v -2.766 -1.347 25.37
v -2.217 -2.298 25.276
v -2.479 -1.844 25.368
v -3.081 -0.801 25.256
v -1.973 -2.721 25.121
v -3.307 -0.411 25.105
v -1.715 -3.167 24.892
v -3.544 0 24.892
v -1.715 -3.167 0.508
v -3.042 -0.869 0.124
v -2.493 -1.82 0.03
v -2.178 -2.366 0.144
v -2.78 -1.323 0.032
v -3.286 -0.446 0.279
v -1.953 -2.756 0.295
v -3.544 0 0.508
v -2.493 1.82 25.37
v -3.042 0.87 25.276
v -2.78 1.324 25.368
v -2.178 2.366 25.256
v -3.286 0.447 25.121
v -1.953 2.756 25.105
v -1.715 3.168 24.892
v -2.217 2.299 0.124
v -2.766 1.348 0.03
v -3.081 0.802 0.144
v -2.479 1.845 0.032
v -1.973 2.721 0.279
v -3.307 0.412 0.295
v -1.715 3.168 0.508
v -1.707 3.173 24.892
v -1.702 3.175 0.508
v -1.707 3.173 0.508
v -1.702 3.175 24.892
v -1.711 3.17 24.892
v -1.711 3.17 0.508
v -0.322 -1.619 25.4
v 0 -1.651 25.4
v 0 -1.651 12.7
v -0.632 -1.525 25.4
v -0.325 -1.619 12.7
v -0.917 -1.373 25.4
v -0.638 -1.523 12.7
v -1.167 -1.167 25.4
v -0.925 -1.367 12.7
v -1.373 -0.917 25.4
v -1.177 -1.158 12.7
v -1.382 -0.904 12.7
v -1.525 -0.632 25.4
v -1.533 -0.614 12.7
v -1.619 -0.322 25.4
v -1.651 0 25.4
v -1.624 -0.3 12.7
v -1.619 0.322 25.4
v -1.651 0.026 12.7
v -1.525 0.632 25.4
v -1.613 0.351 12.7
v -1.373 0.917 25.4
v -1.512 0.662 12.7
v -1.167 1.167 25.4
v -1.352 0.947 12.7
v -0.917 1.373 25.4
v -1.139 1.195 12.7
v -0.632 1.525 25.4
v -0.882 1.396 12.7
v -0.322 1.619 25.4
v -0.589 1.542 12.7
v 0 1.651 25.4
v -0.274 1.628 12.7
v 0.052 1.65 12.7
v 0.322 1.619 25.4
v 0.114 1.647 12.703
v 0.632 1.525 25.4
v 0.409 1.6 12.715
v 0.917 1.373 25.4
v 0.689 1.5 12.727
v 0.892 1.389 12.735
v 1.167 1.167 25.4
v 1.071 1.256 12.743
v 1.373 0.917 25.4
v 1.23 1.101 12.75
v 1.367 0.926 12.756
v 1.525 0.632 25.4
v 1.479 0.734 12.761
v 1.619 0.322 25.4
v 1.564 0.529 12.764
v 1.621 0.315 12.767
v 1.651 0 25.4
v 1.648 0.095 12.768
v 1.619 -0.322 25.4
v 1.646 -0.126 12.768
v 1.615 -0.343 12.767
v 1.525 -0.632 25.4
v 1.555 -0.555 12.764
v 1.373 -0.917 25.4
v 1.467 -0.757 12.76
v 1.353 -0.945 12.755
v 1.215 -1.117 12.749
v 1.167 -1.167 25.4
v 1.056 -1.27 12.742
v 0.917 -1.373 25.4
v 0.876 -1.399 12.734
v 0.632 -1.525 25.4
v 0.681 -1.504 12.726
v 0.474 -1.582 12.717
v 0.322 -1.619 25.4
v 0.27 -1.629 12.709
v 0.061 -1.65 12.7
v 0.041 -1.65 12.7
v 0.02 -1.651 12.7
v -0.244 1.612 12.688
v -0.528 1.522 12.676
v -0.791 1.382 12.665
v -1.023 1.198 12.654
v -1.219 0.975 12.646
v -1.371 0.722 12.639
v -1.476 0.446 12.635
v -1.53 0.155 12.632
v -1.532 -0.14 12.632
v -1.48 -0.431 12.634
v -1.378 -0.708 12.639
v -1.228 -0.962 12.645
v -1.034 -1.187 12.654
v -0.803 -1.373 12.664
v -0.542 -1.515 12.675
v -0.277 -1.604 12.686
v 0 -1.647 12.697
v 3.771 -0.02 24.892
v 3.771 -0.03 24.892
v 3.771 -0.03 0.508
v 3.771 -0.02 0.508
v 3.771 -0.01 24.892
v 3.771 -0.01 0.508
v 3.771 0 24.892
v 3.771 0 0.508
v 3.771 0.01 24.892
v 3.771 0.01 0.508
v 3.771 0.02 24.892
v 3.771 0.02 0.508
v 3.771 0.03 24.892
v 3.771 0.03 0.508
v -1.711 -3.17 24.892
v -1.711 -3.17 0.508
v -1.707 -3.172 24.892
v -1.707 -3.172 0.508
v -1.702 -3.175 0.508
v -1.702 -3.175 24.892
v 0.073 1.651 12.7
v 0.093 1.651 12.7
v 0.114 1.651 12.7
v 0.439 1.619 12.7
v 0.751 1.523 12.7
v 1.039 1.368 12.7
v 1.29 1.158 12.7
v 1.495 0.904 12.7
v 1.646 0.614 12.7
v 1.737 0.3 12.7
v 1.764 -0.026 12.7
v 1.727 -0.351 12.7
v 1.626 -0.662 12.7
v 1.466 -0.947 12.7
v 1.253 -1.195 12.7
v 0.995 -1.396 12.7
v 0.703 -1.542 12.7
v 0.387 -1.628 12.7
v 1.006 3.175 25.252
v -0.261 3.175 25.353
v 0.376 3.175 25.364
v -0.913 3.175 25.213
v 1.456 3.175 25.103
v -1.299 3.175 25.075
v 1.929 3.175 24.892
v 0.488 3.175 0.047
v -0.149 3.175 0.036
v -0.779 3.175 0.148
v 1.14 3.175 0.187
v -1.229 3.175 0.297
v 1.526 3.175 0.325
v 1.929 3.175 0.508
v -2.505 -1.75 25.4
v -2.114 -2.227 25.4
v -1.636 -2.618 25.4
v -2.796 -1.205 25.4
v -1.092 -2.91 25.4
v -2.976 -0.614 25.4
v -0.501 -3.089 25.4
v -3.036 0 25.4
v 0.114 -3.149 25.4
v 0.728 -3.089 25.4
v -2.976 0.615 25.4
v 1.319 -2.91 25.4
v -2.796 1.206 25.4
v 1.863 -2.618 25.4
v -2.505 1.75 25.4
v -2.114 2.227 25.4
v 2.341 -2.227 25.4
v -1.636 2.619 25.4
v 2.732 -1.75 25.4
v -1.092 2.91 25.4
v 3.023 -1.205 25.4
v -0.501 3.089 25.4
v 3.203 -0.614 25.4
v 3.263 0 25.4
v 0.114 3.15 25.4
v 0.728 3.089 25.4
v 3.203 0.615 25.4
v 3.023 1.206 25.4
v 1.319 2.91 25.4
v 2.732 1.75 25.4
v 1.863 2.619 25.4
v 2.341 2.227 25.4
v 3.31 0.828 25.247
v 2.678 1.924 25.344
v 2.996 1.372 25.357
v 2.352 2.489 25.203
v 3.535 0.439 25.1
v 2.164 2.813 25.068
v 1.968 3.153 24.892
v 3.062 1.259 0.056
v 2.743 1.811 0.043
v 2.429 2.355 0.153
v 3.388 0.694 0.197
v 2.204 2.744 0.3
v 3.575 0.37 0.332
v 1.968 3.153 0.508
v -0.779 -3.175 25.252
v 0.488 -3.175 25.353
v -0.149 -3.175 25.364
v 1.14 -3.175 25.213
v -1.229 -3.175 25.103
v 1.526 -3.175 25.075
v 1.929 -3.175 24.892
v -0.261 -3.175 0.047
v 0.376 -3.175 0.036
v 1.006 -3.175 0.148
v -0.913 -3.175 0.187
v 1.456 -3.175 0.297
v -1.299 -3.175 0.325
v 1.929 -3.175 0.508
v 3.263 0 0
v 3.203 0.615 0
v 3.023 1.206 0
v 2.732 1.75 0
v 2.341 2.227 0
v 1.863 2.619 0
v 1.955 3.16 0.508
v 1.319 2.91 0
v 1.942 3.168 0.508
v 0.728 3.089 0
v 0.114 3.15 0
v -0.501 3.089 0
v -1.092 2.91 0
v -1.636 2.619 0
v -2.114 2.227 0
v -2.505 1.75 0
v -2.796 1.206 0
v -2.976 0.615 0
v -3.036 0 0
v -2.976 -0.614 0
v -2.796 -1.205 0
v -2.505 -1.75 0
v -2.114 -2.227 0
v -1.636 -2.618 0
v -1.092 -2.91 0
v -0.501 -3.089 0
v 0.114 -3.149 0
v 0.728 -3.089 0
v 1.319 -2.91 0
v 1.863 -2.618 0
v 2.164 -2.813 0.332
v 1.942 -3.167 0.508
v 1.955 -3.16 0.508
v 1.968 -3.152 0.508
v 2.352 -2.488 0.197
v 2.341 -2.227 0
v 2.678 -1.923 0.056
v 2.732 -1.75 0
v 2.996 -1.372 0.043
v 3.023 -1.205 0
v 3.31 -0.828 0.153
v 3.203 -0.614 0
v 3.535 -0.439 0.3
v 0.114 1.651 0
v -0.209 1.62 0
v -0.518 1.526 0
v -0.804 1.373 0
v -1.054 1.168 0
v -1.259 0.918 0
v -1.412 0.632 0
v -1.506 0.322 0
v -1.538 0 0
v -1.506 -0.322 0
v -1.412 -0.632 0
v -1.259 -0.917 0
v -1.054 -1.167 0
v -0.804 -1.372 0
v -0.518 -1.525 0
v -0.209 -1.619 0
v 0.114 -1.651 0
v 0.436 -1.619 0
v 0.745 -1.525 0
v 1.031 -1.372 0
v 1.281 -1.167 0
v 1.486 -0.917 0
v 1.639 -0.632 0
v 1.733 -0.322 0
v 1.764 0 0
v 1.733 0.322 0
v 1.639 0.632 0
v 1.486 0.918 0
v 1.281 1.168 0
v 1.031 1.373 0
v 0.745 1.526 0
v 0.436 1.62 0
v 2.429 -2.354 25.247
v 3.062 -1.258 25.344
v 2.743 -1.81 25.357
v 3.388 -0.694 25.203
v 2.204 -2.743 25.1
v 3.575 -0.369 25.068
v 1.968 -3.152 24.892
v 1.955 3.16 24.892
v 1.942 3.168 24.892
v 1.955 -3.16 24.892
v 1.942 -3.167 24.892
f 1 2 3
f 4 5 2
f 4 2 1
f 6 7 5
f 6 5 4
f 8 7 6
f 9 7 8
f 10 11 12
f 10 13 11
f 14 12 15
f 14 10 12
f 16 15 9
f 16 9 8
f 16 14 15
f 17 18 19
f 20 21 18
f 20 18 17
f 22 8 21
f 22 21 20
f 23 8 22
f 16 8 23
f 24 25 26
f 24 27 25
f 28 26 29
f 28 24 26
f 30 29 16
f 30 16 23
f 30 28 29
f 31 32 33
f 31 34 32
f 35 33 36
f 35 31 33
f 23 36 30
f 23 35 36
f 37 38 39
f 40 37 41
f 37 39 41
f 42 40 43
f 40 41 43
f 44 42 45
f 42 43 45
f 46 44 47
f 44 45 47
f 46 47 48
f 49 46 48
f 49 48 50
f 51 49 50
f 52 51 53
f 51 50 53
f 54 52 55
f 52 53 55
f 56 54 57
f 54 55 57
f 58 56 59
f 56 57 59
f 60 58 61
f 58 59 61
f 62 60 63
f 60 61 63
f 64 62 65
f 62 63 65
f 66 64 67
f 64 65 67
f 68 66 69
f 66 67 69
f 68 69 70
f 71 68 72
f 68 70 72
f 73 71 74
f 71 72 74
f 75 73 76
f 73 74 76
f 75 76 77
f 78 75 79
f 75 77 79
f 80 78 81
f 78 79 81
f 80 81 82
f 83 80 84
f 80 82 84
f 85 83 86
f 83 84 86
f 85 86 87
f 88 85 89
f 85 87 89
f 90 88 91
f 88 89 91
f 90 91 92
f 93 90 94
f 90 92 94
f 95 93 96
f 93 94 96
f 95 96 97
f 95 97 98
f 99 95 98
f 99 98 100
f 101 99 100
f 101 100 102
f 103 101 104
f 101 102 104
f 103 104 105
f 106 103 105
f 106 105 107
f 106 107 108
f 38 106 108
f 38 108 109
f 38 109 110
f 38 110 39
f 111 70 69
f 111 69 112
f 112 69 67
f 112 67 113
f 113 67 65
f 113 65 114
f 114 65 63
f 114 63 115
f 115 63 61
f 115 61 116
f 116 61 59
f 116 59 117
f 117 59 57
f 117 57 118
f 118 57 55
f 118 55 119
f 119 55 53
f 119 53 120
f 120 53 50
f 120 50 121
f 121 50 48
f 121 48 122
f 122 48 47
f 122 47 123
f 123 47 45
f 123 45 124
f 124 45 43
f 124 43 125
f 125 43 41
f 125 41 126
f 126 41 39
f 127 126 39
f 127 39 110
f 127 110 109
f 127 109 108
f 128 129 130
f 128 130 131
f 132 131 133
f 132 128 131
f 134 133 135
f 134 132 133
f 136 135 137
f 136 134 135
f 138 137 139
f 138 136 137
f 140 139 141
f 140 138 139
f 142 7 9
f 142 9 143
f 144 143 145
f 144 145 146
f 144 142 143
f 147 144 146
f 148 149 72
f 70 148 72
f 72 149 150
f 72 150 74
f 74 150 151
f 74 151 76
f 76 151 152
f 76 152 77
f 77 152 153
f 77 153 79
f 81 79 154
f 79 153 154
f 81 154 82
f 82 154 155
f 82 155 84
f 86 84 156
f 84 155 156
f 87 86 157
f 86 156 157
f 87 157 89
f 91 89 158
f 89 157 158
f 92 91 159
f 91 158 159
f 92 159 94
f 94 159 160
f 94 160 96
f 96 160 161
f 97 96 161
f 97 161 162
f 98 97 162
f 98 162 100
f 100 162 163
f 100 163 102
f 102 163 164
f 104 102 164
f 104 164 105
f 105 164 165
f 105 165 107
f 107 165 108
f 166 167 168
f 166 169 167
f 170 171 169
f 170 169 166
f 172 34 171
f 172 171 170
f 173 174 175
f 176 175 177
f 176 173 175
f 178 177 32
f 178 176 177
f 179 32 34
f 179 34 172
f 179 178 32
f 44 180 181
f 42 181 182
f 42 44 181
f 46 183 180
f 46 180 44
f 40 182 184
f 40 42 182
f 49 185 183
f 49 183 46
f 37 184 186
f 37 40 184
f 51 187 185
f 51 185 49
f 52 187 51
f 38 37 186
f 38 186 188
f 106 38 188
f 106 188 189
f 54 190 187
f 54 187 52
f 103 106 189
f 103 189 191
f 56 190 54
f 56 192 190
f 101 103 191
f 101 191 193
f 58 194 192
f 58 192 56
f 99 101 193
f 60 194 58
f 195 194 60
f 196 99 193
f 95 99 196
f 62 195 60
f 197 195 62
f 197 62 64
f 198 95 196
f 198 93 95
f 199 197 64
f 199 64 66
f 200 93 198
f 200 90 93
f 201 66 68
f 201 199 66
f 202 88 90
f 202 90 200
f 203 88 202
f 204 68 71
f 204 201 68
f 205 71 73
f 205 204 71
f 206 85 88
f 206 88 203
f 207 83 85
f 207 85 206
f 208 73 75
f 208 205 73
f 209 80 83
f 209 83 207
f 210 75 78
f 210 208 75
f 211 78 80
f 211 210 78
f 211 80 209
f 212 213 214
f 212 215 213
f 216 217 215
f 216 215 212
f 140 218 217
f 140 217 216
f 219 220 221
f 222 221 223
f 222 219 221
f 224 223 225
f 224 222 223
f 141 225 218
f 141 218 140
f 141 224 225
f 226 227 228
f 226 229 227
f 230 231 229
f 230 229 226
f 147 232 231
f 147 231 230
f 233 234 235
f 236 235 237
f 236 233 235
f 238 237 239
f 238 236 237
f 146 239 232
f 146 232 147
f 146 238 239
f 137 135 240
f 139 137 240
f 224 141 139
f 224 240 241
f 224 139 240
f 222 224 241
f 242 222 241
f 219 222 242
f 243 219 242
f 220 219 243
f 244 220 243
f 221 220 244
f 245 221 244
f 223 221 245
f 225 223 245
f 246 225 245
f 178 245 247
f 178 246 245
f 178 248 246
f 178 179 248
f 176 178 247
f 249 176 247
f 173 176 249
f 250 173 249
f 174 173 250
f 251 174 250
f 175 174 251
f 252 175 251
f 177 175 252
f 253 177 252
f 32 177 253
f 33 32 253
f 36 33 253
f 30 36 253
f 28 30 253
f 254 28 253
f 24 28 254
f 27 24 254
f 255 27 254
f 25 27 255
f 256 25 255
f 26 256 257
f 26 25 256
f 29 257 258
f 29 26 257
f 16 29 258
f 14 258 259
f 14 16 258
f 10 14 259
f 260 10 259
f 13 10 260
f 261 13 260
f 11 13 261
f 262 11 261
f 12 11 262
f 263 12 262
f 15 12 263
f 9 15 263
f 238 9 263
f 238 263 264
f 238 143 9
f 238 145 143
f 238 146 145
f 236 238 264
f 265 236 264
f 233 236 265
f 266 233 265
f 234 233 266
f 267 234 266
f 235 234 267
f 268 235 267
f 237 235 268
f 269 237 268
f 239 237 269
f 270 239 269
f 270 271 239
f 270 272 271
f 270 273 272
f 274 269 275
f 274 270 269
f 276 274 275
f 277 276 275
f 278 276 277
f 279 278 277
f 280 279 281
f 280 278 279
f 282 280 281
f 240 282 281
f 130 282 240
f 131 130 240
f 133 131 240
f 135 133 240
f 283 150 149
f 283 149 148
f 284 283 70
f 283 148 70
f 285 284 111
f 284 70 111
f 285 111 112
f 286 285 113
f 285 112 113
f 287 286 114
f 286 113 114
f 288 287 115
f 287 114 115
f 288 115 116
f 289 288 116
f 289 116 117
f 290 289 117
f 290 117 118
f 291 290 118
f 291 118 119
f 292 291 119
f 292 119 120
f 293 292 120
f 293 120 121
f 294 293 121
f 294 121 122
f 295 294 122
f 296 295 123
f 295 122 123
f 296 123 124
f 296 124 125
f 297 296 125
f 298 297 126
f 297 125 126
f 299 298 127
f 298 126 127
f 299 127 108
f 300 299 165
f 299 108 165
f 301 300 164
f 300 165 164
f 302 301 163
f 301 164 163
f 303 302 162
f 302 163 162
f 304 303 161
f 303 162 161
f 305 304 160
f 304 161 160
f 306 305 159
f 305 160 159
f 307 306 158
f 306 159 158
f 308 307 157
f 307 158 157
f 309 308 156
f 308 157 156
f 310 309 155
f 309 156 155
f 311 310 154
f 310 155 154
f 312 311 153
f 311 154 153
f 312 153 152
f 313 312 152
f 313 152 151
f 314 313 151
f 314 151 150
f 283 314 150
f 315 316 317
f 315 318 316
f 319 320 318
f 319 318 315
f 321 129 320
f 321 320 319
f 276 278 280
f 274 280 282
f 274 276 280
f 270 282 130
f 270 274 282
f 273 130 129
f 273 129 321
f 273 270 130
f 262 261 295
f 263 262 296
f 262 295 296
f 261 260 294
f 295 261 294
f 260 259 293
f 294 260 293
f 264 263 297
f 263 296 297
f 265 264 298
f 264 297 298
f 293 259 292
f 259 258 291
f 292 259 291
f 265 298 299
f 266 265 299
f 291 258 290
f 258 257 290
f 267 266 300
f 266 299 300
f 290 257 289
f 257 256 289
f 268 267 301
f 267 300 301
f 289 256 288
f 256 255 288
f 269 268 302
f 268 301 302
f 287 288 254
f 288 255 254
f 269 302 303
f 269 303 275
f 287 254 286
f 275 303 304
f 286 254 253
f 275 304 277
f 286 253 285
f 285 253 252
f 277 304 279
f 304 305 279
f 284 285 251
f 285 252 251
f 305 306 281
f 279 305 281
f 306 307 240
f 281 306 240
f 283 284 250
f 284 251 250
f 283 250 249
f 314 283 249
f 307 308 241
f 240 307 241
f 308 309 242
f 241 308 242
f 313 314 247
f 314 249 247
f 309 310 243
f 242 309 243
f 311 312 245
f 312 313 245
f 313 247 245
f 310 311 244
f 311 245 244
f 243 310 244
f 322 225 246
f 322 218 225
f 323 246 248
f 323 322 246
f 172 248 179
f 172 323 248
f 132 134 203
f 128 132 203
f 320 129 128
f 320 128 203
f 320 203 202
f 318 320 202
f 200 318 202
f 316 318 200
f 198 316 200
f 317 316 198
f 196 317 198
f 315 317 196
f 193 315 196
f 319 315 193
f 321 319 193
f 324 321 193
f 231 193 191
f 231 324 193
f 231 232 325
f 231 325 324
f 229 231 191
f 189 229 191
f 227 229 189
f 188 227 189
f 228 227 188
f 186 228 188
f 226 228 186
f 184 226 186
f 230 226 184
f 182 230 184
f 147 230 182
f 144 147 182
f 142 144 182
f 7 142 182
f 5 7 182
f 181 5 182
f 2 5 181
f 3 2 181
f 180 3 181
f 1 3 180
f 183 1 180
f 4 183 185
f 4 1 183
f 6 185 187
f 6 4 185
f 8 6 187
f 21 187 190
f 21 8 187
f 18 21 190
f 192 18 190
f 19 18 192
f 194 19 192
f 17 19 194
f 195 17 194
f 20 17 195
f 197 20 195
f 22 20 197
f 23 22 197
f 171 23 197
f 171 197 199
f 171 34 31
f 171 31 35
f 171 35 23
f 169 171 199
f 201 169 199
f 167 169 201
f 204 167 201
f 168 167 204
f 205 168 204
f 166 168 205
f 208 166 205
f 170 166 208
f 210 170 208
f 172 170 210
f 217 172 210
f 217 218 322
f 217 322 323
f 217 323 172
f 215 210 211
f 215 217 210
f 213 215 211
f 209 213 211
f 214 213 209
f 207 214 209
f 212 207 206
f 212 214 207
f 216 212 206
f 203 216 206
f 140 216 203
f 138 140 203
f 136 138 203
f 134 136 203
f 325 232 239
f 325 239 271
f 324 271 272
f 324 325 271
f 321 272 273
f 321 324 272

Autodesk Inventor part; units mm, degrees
ref_plane "YZ Plane" through (0, 0, 0) normal (1, 0, 0) x (0, 1, 0)
sketch "Sketch1" plane through (0, 0, 0) normal (0, 0, 1) x (1, 0, 0)
  line L0 (1.9552, -3.1747) -> (-1.711, -3.1747)
  line L1 (-1.711, -3.1747) -> (-3.5441, 0.0003)
  line L2 (-3.5441, 0.0003) -> (-1.711, 3.1753)
  line L3 (-1.711, 3.1753) -> (1.9552, 3.1753)
  line L4 (1.9552, 3.1753) -> (3.7883, 0.0003)
  line L5 (3.7883, 0.0003) -> (1.9552, -3.1747)
  point P0 (0.1221, 0.0003)
  dimension "d0" = 6.35
extrude "Extrusion1" add sketch "Sketch1" along normal blind 25.4
ref_plane "Work Plane1" through (-1.711, 0.0003, 0) normal (0, 1, 0) x (1, 0, 0)
sketch "Sketch3" plane through (-1.711, 0.0003, 0) normal (0, 1, 0) x (1, 0, 0)
  line L0 (-1.3251, 0) -> (4.9741, 0)
  line L1 (5.4821, -0.508) -> (5.4821, -24.892)
  line L2 (-1.8331, -24.892) -> (-1.8331, -0.508)
  line L3 (-1.8331, -0.508) -> (-1.3251, 0)
  line L4 (4.9741, 0) -> (5.4821, -0.508)
  line L5 (-1.8331, 0) -> (-1.8331, -25.4) projected
  line L6 (3.6662, 0) -> (5.4993, 0) projected
  line L7 (1.8245, 0) -> (1.8245, -25.4)
  line L8 (0, -25.4) -> (-1.8331, -25.4) projected
  line L9 (5.4993, -25.4) -> (3.6662, -25.4) projected
  line L10 (3.6662, -25.4) -> (0, -25.4) projected
  line L11 (-1.3251, -25.4) -> (-1.8331, -24.892)
  line L12 (4.9741, -25.4) -> (5.4821, -24.892)
  point P0 (-1.8331, 0)
  point P1 (5.4821, 0)
  point P2 (5.4821, -25.4)
  dimension "d5" = 0.508
  dimension "d6" = 0.508
  dimension "d7" = 0.508
  dimension "d8" = 0.508
  dimension "d16" = 0
  dimension "d46" = 0.508
  dimension "d47" = 0.508
  dimension "d48" = 0.508
  dimension "d49" = 0.508
revolve "Revolution1" cut sketch "Sketch3" angle 360 about axis through (0.1135, 0.0003, 0) along (0, 0, 1) keep common part contours L0 L4 L1 L12 L9 L10 L7
sketch "Sketch6" plane through (0.1135, 0.0003, 0) normal (0, 0, -1) x (-1, 0, 0)
  circle A0 centre (0, 0) radius 3.1496 projected
hole "Hole3" at (0.1135, 0.0003, 0) direction (0, 0, 1) diameter 3.302 depth 12.7 tip angle 118 thread size "8-32 UNC" class "2B" standard "ANSI Unified Screw Threads"
sketch "Sketch7" plane through (0, 0, 25.4) normal (0, 0, 1) x (1, 0, 0)
  point P0 (0, 0)
hole "Hole4" at (0, 0, 25.4) direction (0, 0, -1) diameter 3.302 depth 12.7 tip angle 118 thread size "8-32 UNC" class "2B" standard "ANSI Unified Screw Threads"
ref_plane "Work Plane2" through (0.1135, 0.0003, 12.7) normal (0, 0, -1) x (-1, 0, 0)
equation "\"d6\" = d5"
equation "\"d7\" = d5"
equation "\"d8\" = d7"
properties part number "275-1016" material "Steel"
